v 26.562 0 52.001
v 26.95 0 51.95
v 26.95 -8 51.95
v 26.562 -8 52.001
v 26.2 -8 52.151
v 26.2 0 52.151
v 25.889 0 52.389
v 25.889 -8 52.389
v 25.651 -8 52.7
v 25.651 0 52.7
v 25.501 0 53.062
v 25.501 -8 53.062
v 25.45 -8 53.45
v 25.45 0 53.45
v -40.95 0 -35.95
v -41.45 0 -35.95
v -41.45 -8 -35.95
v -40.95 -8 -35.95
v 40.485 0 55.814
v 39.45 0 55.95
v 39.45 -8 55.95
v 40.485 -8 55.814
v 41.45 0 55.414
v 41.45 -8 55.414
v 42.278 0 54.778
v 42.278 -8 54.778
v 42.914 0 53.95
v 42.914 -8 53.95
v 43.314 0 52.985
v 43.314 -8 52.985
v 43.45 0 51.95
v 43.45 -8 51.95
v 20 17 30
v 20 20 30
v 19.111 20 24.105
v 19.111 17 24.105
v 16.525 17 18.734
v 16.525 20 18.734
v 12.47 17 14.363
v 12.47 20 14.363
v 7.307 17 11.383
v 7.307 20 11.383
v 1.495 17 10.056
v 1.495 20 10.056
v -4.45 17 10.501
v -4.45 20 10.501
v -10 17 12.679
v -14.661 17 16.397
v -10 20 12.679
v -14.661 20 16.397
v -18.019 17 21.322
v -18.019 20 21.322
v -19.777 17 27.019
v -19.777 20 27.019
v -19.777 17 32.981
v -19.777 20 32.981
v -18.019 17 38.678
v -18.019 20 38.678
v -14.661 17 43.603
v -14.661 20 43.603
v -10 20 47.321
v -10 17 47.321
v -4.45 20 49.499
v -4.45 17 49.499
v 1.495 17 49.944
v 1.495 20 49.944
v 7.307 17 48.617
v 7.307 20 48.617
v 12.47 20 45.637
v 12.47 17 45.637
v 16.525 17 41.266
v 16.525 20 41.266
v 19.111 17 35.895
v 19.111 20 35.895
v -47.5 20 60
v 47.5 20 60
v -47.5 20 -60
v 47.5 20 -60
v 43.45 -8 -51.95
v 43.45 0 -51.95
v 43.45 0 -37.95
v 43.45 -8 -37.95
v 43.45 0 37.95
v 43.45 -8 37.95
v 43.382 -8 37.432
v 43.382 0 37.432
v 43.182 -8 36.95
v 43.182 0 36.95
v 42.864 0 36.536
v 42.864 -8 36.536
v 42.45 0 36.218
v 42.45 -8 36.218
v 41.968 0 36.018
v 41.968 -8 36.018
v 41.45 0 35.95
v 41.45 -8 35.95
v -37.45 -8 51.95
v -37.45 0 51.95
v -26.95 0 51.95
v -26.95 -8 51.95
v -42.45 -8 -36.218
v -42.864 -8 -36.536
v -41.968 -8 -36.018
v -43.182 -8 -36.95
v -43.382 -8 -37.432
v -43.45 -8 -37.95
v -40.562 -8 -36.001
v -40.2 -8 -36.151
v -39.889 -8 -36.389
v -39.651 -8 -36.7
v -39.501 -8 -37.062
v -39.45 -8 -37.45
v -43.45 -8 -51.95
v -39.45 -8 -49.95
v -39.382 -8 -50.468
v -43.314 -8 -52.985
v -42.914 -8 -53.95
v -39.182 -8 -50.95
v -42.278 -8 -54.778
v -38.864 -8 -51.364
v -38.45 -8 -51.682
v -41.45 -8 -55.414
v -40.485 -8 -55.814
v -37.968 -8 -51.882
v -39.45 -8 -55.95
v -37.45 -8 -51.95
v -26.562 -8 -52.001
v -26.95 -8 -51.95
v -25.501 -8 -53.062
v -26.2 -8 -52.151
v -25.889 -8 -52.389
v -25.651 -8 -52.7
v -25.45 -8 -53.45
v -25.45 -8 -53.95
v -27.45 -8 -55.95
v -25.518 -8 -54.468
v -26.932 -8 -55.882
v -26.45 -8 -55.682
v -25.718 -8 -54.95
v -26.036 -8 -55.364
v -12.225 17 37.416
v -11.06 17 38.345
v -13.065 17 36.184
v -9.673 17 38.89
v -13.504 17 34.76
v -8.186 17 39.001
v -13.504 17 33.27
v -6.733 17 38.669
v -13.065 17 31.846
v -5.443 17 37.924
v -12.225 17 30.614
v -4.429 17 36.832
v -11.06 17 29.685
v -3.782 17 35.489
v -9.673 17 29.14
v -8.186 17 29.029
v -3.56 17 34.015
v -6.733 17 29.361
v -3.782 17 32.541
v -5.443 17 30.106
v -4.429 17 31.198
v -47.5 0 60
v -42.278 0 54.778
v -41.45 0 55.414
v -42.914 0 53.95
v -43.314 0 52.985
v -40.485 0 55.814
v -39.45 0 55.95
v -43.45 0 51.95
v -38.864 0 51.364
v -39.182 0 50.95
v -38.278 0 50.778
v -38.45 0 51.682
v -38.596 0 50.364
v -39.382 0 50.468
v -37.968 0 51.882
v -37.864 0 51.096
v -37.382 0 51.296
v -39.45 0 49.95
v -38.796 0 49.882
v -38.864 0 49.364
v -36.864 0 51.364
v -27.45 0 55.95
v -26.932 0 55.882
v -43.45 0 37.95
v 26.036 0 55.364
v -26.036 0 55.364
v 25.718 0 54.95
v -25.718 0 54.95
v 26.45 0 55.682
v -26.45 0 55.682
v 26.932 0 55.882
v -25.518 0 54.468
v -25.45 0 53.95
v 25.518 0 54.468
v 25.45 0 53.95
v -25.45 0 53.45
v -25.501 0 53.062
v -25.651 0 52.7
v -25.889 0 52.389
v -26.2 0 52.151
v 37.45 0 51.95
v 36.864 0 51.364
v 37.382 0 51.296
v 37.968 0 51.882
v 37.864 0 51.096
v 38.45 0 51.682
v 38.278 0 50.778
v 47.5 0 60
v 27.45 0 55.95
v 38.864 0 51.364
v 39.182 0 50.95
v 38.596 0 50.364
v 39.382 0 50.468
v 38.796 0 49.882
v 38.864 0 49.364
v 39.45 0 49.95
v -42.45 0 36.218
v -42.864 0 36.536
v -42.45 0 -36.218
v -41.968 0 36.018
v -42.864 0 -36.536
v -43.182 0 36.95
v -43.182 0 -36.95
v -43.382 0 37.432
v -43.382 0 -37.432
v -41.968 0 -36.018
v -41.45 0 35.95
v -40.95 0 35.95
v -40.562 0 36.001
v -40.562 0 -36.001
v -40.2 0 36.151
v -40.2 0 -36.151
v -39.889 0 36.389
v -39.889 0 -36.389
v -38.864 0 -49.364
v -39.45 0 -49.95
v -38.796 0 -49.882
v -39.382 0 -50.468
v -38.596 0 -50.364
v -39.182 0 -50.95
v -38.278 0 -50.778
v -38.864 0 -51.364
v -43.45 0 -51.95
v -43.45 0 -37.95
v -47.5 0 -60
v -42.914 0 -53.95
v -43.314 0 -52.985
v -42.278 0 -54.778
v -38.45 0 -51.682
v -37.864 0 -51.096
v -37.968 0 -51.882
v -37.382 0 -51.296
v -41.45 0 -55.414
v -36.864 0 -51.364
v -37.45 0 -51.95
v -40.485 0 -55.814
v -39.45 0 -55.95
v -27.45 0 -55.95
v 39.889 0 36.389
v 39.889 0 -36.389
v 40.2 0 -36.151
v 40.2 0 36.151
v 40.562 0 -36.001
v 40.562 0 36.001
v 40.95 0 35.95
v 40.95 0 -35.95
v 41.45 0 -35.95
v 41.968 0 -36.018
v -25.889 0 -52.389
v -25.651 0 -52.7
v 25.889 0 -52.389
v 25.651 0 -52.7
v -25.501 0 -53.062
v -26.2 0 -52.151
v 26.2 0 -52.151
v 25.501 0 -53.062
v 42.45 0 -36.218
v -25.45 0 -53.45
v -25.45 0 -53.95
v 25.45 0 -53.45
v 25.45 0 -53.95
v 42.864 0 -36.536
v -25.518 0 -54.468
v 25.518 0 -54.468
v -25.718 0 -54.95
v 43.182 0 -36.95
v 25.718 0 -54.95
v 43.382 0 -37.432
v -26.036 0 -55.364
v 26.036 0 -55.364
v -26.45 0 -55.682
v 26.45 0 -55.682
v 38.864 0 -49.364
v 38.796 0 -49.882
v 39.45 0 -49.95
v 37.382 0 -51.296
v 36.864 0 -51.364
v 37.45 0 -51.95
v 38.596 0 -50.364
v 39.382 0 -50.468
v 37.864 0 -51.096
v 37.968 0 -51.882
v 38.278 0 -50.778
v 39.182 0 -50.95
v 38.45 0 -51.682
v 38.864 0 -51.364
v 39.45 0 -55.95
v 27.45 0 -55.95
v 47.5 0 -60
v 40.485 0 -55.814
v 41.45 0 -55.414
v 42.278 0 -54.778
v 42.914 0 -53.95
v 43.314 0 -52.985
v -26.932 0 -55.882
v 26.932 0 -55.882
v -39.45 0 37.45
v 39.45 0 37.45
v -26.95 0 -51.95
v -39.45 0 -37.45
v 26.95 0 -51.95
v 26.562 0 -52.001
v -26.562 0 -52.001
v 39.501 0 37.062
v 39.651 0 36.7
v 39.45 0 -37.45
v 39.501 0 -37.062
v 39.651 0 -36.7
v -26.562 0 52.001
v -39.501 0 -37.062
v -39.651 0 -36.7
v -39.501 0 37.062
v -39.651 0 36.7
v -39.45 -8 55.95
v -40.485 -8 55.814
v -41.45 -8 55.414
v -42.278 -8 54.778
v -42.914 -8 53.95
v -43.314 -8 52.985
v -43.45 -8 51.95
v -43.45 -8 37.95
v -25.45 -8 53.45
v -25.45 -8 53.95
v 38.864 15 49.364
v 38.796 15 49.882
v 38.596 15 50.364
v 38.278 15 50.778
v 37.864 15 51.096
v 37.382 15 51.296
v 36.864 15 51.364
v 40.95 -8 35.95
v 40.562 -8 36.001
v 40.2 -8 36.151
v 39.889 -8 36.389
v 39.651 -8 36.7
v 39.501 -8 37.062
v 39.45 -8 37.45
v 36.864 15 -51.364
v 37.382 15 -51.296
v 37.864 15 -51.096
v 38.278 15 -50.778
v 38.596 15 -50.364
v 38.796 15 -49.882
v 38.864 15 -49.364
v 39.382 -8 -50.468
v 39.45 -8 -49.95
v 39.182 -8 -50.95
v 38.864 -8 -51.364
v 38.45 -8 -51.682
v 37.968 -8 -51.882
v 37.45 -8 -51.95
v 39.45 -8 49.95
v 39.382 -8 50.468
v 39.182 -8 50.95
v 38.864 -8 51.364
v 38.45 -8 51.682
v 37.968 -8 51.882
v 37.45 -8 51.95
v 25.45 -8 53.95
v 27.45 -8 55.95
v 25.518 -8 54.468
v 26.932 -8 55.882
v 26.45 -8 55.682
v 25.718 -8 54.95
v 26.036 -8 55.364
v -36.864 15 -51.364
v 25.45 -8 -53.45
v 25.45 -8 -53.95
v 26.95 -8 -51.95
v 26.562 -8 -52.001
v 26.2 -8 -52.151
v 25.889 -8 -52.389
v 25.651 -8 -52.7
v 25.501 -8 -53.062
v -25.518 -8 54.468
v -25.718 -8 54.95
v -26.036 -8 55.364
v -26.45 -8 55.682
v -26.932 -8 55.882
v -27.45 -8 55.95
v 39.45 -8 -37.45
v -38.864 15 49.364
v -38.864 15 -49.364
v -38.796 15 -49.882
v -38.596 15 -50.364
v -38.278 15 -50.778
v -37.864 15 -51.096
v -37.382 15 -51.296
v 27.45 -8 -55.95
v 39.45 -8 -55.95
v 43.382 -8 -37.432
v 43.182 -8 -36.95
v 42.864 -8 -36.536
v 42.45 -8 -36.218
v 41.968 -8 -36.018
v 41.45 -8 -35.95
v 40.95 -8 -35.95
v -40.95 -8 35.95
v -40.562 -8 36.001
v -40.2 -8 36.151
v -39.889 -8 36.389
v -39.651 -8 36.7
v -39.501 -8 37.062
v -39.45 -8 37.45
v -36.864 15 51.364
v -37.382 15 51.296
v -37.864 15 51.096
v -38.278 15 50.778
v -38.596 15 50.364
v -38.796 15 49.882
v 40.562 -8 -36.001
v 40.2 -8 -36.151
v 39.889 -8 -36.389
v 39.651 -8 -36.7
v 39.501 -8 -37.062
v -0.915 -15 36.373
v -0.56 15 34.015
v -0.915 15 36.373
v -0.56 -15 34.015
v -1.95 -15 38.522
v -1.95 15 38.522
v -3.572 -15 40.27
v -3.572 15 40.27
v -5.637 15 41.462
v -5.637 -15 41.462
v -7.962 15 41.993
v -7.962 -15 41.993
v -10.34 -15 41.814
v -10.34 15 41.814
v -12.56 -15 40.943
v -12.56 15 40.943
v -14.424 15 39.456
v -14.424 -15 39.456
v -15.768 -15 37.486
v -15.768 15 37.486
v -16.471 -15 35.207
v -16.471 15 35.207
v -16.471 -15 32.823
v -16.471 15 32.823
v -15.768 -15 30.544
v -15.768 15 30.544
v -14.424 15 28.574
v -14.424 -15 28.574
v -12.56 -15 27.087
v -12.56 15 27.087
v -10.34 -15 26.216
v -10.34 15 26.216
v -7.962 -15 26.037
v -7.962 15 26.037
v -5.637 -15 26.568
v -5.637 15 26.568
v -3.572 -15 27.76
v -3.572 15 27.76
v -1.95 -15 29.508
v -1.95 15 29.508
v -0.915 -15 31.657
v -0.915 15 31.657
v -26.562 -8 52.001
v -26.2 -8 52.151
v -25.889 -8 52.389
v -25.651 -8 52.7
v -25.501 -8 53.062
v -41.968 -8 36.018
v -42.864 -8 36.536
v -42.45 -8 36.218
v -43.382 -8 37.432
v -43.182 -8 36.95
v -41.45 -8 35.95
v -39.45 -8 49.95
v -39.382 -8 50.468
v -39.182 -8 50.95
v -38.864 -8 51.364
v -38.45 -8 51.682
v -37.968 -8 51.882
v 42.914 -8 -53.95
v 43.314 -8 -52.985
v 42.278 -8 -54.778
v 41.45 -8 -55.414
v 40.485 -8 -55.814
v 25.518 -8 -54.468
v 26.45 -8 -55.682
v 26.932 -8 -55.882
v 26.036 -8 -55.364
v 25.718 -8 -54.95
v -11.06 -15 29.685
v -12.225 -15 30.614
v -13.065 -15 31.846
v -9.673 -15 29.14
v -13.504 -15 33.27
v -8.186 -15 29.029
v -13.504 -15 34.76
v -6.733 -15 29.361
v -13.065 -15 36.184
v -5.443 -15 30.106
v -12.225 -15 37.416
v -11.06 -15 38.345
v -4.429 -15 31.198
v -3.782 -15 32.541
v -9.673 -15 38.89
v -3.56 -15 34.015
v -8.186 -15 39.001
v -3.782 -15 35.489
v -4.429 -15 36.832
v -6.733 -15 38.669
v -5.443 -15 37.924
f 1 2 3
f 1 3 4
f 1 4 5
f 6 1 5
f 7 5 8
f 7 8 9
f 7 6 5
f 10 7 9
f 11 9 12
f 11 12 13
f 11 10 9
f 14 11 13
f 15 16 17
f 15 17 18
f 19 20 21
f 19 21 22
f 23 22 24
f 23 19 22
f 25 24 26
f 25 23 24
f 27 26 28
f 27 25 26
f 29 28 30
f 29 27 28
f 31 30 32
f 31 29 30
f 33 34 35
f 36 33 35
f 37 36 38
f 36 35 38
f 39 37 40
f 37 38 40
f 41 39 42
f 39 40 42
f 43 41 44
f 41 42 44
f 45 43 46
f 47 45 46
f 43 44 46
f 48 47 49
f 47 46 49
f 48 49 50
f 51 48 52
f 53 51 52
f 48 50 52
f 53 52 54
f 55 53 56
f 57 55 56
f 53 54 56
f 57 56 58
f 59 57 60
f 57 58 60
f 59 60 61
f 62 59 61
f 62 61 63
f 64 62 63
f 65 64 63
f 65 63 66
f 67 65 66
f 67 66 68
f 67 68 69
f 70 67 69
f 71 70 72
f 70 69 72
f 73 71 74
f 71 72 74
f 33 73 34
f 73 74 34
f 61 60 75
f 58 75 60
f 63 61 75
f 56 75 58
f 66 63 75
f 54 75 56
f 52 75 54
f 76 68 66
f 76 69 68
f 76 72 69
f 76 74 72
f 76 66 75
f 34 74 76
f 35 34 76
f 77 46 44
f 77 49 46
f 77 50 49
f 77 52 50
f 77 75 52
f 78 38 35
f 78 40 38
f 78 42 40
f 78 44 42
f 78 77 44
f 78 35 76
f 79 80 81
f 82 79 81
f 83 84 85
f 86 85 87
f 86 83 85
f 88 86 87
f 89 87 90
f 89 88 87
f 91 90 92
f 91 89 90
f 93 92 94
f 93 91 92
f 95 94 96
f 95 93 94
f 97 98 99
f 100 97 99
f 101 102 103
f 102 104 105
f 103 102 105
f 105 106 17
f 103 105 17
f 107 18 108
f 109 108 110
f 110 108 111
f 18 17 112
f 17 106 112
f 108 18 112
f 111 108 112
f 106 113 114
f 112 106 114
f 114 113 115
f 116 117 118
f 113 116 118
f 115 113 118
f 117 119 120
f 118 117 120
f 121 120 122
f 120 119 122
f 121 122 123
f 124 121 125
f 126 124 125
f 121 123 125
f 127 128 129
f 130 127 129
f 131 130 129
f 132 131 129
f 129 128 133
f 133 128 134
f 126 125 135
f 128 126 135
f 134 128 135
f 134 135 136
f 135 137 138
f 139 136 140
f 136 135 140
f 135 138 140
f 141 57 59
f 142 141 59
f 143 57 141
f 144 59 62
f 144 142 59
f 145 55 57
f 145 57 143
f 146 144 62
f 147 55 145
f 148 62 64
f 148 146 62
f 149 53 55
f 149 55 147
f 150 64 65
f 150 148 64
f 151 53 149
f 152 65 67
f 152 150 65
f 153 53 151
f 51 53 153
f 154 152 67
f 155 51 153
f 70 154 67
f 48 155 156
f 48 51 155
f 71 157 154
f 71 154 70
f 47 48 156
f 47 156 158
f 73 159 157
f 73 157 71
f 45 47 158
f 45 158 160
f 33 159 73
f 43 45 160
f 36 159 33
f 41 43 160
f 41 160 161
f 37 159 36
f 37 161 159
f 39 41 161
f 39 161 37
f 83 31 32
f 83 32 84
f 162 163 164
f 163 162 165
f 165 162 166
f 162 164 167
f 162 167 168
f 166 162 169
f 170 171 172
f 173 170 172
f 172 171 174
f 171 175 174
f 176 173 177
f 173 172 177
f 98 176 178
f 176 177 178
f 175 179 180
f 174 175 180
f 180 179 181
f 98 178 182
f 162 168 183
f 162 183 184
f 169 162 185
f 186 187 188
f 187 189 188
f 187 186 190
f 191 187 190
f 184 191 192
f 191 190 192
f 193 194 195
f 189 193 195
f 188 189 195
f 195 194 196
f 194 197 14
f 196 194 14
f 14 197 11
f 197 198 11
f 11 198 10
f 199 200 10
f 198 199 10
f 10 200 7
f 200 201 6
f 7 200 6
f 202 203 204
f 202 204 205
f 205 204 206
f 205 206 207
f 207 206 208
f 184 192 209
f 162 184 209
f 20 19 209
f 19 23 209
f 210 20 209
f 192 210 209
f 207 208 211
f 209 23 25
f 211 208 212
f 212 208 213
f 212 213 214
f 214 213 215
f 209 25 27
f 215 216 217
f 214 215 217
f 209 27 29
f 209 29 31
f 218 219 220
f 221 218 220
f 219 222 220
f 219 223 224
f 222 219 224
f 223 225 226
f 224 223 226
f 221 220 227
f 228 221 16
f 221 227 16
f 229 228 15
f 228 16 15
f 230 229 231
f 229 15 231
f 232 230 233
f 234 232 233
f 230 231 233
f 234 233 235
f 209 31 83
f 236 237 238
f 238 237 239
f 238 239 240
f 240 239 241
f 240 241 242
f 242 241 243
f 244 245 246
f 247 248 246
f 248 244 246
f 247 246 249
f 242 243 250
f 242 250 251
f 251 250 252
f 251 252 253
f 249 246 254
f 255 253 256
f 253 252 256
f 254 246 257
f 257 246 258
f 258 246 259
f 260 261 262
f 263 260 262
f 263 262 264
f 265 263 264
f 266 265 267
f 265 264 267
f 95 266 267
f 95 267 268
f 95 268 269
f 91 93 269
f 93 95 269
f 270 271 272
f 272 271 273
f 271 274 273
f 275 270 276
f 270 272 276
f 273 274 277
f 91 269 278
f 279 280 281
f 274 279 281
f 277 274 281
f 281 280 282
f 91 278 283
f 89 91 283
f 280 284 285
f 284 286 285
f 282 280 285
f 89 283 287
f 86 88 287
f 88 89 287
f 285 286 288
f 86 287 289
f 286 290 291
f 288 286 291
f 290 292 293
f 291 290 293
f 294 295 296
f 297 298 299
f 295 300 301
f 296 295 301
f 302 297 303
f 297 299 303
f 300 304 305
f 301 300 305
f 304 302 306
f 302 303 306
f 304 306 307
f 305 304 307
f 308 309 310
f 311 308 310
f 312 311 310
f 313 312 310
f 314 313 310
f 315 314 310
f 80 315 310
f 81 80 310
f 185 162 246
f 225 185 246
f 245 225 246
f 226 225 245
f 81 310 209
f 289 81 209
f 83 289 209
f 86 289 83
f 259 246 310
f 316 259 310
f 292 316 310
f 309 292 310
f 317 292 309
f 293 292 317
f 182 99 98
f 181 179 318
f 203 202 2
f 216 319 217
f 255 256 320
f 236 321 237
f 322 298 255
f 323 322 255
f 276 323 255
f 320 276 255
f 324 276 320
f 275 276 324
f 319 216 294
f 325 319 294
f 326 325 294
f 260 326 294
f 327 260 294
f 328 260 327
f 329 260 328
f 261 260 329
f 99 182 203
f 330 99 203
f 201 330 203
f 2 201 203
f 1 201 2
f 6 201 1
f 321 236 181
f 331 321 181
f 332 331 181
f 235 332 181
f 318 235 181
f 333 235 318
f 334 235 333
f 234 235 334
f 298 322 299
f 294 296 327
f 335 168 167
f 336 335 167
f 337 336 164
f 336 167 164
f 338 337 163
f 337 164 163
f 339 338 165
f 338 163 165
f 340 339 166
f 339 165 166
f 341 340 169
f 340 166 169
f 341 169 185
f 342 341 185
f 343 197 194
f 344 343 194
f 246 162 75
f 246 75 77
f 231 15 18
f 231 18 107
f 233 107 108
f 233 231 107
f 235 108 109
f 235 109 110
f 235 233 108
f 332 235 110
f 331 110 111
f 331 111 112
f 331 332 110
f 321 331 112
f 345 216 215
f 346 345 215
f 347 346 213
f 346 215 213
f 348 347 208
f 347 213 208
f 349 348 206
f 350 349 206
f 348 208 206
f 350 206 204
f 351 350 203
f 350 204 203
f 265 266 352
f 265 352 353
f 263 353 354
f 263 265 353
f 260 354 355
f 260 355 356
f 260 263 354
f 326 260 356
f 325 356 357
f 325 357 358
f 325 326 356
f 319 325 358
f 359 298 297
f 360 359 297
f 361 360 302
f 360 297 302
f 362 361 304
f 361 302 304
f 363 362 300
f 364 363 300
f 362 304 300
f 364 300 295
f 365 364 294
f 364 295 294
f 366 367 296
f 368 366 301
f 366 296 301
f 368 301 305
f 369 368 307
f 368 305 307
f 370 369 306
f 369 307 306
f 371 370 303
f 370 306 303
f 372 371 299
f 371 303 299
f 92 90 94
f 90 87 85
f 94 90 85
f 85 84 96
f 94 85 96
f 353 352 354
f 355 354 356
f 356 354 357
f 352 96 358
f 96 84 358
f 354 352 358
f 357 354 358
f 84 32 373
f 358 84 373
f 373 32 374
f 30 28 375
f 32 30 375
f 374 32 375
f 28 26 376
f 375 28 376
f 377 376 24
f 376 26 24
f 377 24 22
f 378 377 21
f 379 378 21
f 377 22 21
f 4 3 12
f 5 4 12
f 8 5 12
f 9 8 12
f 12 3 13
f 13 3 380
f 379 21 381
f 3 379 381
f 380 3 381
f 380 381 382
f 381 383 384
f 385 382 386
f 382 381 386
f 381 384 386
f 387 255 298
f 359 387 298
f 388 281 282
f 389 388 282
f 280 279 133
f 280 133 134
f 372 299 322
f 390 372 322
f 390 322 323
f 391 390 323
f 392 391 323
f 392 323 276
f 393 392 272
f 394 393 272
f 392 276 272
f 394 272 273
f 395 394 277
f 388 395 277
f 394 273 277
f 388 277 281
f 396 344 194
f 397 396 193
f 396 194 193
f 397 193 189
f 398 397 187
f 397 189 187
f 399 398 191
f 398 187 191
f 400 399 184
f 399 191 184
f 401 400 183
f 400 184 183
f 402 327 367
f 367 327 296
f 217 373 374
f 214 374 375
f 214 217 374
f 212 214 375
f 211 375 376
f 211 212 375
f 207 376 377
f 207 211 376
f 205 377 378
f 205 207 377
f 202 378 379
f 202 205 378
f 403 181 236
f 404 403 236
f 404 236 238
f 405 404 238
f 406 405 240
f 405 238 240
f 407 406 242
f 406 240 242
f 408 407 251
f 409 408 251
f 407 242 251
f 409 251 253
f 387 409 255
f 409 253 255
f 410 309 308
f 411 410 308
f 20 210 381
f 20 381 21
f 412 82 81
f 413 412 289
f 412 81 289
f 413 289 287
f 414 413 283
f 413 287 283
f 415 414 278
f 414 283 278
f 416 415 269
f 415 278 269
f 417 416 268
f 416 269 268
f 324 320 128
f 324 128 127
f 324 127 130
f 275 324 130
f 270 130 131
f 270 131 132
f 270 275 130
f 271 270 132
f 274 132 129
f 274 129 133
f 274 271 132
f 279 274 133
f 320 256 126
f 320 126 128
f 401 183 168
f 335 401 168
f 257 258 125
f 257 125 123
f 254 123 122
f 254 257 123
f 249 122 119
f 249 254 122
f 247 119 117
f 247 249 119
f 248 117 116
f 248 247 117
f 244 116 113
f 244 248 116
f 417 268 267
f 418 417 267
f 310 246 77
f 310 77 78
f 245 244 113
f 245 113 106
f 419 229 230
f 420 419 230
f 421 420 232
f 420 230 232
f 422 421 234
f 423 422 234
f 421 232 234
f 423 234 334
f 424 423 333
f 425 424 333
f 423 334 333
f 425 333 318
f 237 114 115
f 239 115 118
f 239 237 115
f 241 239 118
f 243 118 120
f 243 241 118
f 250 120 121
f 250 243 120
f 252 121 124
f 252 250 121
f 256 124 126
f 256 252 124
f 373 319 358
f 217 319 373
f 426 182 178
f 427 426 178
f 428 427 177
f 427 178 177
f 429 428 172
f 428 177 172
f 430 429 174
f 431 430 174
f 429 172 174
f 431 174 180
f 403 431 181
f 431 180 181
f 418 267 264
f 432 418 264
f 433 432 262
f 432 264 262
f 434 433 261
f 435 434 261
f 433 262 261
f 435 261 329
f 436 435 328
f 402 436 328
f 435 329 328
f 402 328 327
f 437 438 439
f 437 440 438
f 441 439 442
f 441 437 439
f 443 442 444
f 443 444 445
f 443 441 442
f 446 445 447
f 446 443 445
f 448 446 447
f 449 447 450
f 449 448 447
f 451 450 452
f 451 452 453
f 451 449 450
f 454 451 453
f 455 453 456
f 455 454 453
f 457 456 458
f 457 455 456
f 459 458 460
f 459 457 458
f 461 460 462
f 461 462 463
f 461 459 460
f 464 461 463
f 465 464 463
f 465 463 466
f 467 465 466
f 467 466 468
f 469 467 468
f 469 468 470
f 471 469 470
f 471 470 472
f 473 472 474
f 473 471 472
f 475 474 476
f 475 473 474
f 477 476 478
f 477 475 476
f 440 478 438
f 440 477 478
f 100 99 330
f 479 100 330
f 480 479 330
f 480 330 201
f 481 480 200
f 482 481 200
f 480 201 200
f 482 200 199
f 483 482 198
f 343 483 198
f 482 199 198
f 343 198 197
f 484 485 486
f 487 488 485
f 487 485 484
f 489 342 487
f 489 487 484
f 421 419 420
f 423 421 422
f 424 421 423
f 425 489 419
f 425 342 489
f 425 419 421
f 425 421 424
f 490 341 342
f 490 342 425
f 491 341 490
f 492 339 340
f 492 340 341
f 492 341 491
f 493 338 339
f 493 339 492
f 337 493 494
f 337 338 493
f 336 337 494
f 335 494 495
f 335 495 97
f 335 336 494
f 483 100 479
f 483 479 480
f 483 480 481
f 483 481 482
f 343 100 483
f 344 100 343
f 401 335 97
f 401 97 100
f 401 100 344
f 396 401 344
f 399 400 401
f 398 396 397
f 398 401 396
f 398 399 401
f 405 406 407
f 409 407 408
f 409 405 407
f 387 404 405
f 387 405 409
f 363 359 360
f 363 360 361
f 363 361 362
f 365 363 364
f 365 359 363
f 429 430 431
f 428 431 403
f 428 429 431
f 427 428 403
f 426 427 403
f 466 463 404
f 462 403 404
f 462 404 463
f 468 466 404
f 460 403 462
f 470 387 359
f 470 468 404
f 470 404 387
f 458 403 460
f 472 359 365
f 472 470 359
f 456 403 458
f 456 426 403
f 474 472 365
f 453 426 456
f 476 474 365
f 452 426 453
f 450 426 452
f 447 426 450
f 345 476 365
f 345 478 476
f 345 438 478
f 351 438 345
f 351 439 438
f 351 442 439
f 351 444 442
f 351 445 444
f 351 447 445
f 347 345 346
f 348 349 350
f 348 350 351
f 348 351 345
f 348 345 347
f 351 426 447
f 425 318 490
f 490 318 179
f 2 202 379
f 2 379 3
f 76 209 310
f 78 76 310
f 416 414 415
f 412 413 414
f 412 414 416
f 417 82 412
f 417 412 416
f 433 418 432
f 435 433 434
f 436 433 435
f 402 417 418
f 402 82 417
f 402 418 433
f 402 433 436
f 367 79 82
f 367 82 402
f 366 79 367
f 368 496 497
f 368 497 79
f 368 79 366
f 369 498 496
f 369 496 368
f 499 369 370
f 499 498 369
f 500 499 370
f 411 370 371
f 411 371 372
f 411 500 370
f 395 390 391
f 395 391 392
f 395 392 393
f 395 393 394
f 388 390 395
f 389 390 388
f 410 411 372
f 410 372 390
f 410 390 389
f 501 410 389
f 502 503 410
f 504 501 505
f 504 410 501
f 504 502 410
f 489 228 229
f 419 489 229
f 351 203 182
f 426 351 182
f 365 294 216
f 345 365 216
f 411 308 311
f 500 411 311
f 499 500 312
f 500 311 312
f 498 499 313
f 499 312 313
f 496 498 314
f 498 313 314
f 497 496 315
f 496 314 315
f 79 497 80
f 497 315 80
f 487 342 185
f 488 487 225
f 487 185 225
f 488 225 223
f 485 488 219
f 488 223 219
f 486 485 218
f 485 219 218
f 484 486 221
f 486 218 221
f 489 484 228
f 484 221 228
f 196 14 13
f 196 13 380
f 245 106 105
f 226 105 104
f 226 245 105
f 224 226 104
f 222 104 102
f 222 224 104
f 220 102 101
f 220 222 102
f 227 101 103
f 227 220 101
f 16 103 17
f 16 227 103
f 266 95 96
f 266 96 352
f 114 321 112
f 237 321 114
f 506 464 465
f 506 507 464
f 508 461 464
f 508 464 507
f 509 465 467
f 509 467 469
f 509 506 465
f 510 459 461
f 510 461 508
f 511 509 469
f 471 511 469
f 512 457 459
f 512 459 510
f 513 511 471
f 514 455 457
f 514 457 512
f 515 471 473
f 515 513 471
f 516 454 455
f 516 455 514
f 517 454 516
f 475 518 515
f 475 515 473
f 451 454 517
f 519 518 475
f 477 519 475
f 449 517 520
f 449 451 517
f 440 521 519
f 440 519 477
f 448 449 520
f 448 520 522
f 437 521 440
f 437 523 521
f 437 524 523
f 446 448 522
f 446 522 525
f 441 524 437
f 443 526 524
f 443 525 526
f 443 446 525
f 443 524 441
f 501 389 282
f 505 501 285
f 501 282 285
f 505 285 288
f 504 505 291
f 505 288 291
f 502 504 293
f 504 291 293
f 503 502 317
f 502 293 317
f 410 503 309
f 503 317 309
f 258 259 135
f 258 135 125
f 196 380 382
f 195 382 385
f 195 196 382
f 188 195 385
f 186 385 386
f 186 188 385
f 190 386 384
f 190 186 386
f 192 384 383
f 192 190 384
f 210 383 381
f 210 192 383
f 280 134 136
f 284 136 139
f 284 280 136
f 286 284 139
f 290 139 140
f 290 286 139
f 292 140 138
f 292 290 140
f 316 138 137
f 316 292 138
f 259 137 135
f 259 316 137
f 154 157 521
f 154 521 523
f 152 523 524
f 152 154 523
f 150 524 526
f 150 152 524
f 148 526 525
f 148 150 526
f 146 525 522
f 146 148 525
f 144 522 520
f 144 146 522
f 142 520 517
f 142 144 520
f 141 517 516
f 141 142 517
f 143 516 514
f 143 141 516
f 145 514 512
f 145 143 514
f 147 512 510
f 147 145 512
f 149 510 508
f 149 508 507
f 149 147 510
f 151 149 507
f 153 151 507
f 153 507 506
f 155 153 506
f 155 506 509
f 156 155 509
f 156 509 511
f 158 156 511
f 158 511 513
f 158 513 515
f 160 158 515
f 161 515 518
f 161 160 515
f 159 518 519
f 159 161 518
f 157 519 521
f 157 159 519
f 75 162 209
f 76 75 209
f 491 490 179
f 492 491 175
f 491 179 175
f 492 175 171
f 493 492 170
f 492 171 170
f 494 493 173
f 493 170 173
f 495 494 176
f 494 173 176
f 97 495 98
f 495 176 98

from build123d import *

# Parameters (mm, degrees)
SKETCH2_W                                  = 95
SKETCH2_H                                  = 120
TOP_PLATE_DEPTH                            = 20
FRICTION_CLIP_DEPTH                        = 8
F_4_CLIPS_AT_THE_SECOND_PLANE_COPY_1_DEPTH = 8
CUT_EXTRUDE1_DEPTH                         = 15
SKETCH5_R                                  = 5
SNOOZE_HOLE_DEPTH                          = 29
SKETCH6_R                                  = 8
SKETCH6_R_2                                = 5
SNOOZE_HOLE_SUPPORT_DEPTH                  = 15
SNOOZE_HOLE_SUPPORT_DEPTH_BACK             = 15
SKETCH9_R                                  = 20
LAKE_INLAY_DEPTH                           = 3


with BuildPart() as part:
    # Sketch2 → top plate (new body)
    with BuildSketch(Plane(origin=(0, 0, 0), x_dir=(1, 0, 0), z_dir=(0, 1, 0))):
        Rectangle(SKETCH2_W, SKETCH2_H)
    extrude(amount=TOP_PLATE_DEPTH)

    # Sketch3 → friction clip (add)
    with BuildSketch(Plane.XZ):
        with BuildLine():
            Line((-37.45, 51.95), (-26.95, 51.95))
            ThreePointArc((-26.95, 51.95), (-25.889339828, 52.389339828), (-25.45, 53.45))
            Line((-25.45, 53.45), (-25.45, 53.95))
            ThreePointArc((-25.45, 53.95), (-26.035786438, 55.364213562), (-27.45, 55.95))
            Line((-27.45, 55.95), (-39.45, 55.95))
            ThreePointArc((-39.45, 55.95), (-42.278427125, 54.778427125), (-43.45, 51.95))
            Line((-43.45, 51.95), (-43.45, 37.95))
            ThreePointArc((-43.45, 37.95), (-42.864213562, 36.535786438), (-41.45, 35.95))
            Line((-41.45, 35.95), (-40.95, 35.95))
            ThreePointArc((-40.95, 35.95), (-39.889339828, 36.389339828), (-39.45, 37.45))
            Line((-39.45, 37.45), (-39.45, 49.95))
            ThreePointArc((-39.45, 49.95), (-38.864213562, 51.364213562), (-37.45, 51.95))
        make_face()
    friction_clip = extrude(amount=FRICTION_CLIP_DEPTH)

    # 4 clips: friction clip across plane
    add(friction_clip.mirror(Plane.XY))

    # 4 clips at the second plane: friction clip across plane
    add(friction_clip.mirror(Plane(origin=(0, 0, 0), x_dir=(0, 0, 1), z_dir=(1, 0, 0))))

    # 4 clips at the second plane copy 1 sketc → 4 clips at the second plane copy 1 (add)
    with BuildSketch(Plane(origin=(0, 0, 0), x_dir=(-1, 0, 0), z_dir=(0, -1, 0))):
        with BuildLine():
            Line((-37.45, 51.95), (-26.95, 51.95))
            ThreePointArc((-26.95, 51.95), (-25.889339828, 52.389339828), (-25.45, 53.45))
            Line((-25.45, 53.45), (-25.45, 53.95))
            ThreePointArc((-25.45, 53.95), (-26.035786438, 55.364213562), (-27.45, 55.95))
            Line((-27.45, 55.95), (-39.45, 55.95))
            ThreePointArc((-39.45, 55.95), (-42.278427125, 54.778427125), (-43.45, 51.95))
            Line((-43.45, 51.95), (-43.45, 37.95))
            ThreePointArc((-43.45, 37.95), (-42.864213562, 36.535786438), (-41.45, 35.95))
            Line((-41.45, 35.95), (-40.95, 35.95))
            ThreePointArc((-40.95, 35.95), (-39.889339828, 36.389339828), (-39.45, 37.45))
            Line((-39.45, 37.45), (-39.45, 49.95))
            ThreePointArc((-39.45, 49.95), (-38.864213562, 51.364213562), (-37.45, 51.95))
        make_face()
    extrude(amount=F_4_CLIPS_AT_THE_SECOND_PLANE_COPY_1_DEPTH)

    # Sketch8 → Cut-Extrude1 (cut)
    with BuildSketch(Plane.XZ):
        with BuildLine():
            Line((-36.864213562, -51.364213562), (36.864213562, -51.364213562))
            ThreePointArc((36.864213562, -51.364213562), (38.278427125, -50.778427125), (38.864213562, -49.364213562))
            Line((38.864213562, -49.364213562), (38.864213562, 49.364213562))
            ThreePointArc((38.864213562, 49.364213562), (38.278427125, 50.778427125), (36.864213562, 51.364213562))
            Line((36.864213562, 51.364213562), (-36.864213562, 51.364213562))
            ThreePointArc((-36.864213562, 51.364213562), (-38.278427125, 50.778427125), (-38.864213562, 49.364213562))
            Line((-38.864213562, 49.364213562), (-38.864213562, -49.364213562))
            ThreePointArc((-38.864213562, -49.364213562), (-38.278427125, -50.778427125), (-36.864213562, -51.364213562))
        make_face()
    extrude(amount=-CUT_EXTRUDE1_DEPTH, mode=Mode.SUBTRACT)

    # Sketch5 → snooze hole (cut, through all)
    with BuildSketch(Plane(origin=(0, 20, 0), x_dir=(1, 0, 0), z_dir=(0, 1, 0))):
        with Locations((-8.56, -34.015)):
            Circle(SKETCH5_R)
    extrude(amount=-SNOOZE_HOLE_DEPTH, mode=Mode.SUBTRACT)

    # Sketch6 → snooze hole support (add, two sides)
    with BuildSketch(Plane.XZ) as snooze_hole_support_sk:
        with Locations((-8.56, 34.015)):
            Circle(SKETCH6_R)
        with Locations((-8.56, 34.015)):
            Circle(SKETCH6_R_2, mode=Mode.SUBTRACT)
    extrude(amount=SNOOZE_HOLE_SUPPORT_DEPTH)
    extrude(snooze_hole_support_sk.sketch, amount=-SNOOZE_HOLE_SUPPORT_DEPTH_BACK)

    # Sketch9 → lake inlay (cut)
    with BuildSketch(Plane(origin=(0, 20, 0), x_dir=(1, 0, 0), z_dir=(0, 1, 0))):
        with Locations((0, -30)):
            Circle(SKETCH9_R)
    extrude(amount=-LAKE_INLAY_DEPTH, mode=Mode.SUBTRACT)


solid = part.part
